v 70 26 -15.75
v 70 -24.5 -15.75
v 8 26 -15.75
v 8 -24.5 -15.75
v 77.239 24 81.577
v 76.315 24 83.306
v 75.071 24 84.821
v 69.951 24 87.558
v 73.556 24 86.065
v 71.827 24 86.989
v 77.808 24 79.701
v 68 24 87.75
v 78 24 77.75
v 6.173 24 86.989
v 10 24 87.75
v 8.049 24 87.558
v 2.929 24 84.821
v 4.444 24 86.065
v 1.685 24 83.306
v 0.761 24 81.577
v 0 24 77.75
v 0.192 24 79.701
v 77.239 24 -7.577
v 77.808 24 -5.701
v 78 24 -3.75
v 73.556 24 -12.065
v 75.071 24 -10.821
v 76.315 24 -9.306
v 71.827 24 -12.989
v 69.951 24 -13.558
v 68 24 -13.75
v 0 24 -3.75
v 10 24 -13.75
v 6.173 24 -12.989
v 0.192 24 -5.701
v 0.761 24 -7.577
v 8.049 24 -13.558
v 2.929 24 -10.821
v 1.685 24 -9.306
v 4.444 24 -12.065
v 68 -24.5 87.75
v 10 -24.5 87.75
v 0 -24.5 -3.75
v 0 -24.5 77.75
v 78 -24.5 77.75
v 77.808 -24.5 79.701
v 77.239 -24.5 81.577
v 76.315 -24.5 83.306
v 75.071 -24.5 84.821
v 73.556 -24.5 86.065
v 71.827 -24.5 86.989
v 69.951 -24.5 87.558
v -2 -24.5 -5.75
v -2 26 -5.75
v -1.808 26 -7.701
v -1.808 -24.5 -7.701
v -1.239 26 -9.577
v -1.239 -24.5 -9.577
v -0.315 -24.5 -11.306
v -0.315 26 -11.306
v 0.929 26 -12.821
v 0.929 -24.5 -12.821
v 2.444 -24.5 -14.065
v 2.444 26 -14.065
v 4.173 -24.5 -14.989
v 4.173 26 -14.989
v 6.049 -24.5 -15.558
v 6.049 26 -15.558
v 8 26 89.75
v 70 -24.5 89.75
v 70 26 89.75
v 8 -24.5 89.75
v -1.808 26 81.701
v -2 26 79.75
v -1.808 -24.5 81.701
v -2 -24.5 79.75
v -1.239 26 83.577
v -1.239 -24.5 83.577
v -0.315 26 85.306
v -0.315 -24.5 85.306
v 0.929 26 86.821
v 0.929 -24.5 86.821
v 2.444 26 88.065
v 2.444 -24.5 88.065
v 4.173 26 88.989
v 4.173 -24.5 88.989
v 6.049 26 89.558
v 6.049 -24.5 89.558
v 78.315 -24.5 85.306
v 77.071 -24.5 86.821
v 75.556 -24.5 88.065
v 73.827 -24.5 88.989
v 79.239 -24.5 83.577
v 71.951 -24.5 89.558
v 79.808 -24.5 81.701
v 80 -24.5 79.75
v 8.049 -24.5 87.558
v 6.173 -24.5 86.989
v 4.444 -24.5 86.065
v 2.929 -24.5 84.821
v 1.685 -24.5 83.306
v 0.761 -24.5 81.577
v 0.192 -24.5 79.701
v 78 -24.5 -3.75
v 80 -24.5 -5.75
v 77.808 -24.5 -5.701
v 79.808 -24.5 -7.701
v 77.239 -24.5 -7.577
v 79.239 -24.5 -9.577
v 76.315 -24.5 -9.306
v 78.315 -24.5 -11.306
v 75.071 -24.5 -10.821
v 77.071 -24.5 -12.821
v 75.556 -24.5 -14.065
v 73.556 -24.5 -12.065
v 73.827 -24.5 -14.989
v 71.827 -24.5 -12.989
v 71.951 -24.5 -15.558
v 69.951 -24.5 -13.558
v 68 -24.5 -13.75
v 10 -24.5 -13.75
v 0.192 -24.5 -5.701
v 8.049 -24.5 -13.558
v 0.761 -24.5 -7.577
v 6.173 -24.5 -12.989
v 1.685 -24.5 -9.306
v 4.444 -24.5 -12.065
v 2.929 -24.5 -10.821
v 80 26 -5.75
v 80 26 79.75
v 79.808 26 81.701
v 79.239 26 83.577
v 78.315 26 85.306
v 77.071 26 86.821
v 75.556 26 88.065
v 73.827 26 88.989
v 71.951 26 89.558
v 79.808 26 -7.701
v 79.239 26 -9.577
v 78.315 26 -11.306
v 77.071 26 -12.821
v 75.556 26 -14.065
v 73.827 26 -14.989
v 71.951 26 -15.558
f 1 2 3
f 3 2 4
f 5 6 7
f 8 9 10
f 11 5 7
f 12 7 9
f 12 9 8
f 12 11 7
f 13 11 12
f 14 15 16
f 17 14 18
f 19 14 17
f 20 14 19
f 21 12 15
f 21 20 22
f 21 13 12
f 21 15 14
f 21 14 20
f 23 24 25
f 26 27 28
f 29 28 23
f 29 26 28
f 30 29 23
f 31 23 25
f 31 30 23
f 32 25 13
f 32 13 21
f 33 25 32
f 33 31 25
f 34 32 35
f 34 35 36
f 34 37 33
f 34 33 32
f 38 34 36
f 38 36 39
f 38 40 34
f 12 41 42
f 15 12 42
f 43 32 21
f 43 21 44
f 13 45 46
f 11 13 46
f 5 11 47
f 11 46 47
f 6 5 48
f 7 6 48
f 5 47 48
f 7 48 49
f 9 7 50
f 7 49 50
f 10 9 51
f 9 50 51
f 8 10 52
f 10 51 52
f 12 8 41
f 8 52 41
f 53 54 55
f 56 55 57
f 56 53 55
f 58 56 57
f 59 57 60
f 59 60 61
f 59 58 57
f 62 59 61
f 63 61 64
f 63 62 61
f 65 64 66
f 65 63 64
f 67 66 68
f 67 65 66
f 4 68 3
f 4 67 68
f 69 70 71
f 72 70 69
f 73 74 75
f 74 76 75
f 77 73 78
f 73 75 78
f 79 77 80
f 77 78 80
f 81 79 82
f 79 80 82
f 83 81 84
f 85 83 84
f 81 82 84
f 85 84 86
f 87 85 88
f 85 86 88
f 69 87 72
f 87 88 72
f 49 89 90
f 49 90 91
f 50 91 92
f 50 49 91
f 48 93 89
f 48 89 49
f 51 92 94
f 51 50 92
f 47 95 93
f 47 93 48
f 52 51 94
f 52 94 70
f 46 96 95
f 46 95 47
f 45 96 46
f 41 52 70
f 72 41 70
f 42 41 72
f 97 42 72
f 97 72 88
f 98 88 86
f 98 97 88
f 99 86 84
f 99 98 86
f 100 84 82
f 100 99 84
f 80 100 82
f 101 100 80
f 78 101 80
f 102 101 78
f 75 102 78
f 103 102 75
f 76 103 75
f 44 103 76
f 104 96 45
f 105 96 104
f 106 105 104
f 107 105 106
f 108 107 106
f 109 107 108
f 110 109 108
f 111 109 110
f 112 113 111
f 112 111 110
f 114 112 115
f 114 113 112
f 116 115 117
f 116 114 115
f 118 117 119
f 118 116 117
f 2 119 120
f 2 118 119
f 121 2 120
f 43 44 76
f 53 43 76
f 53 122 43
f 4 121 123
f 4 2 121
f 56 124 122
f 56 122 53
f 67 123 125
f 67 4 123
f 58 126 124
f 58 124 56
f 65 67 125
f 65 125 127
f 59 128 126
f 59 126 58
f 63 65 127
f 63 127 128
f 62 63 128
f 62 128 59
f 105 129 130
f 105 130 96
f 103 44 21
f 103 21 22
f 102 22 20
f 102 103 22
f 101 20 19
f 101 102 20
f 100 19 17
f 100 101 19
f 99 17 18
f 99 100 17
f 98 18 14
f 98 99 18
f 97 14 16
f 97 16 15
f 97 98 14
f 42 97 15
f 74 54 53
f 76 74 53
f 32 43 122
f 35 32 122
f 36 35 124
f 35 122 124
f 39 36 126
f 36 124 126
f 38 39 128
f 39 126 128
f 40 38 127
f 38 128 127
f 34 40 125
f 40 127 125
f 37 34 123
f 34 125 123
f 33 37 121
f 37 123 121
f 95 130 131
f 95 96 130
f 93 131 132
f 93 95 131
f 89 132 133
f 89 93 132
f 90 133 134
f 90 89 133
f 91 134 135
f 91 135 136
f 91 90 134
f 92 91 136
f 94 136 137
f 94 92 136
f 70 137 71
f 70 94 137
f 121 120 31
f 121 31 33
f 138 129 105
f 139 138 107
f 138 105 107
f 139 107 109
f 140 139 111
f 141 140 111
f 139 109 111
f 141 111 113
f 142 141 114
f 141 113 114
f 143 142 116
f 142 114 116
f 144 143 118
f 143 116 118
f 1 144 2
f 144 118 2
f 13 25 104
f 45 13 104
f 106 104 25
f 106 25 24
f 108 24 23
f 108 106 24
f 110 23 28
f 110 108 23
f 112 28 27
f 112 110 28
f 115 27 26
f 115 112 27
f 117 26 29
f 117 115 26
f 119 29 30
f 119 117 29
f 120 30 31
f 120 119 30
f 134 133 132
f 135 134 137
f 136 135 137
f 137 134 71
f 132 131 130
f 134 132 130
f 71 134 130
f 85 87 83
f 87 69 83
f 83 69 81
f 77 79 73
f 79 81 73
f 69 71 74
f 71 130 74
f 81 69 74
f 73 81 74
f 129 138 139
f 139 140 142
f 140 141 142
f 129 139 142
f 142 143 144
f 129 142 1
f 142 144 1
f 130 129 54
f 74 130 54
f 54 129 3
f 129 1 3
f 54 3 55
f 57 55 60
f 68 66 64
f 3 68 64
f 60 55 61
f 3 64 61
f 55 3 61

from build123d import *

# Parameters (mm, degrees)
BOX016_W     = 78
BOX016_H     = 50.5
BOX016_DEPTH = 101.5
FILLET018_R  = 10
BOX015_W     = 82
BOX015_H     = 50.5
BOX015_DEPTH = 105.5
FILLET015_R  = 10


with BuildPart() as innerboxcut001:
    # Box016 → Box016 (new body)
    with BuildSketch(Plane(origin=(78, 24, -13.75), x_dir=(-1, 0, 0), z_dir=(0, 0, 1))):
        with Locations((39, 25.25)):
            Rectangle(BOX016_W, BOX016_H)
    extrude(amount=BOX016_DEPTH)

    # Fillet018
    fillet018_edges = [innerboxcut001.edges().sort_by_distance(p)[0] for p in [
        (78, -1.25, 87.75),
        (78, -1.25, -13.75),
        (0, -1.25, 87.75),
        (0, -1.25, -13.75),
    ]]
    fillet(fillet018_edges, radius=FILLET018_R)


with BuildPart() as outershellbottom:
    # Box015 → Box015 (new body)
    with BuildSketch(Plane(origin=(80, 26, -15.75), x_dir=(-1, 0, 0), z_dir=(0, 0, 1))):
        with Locations((41, 25.25)):
            Rectangle(BOX015_W, BOX015_H)
    extrude(amount=BOX015_DEPTH)

    # Fillet015
    fillet015_edges = [outershellbottom.edges().sort_by_distance(p)[0] for p in [
        (80, 0.75, 89.75),
        (80, 0.75, -15.75),
        (-2, 0.75, 89.75),
        (-2, 0.75, -15.75),
    ]]
    fillet(fillet015_edges, radius=FILLET015_R)

    # Cut006: cut innerBoxCut001
    add(innerboxcut001.part, mode=Mode.SUBTRACT)


solid = outershellbottom.part
